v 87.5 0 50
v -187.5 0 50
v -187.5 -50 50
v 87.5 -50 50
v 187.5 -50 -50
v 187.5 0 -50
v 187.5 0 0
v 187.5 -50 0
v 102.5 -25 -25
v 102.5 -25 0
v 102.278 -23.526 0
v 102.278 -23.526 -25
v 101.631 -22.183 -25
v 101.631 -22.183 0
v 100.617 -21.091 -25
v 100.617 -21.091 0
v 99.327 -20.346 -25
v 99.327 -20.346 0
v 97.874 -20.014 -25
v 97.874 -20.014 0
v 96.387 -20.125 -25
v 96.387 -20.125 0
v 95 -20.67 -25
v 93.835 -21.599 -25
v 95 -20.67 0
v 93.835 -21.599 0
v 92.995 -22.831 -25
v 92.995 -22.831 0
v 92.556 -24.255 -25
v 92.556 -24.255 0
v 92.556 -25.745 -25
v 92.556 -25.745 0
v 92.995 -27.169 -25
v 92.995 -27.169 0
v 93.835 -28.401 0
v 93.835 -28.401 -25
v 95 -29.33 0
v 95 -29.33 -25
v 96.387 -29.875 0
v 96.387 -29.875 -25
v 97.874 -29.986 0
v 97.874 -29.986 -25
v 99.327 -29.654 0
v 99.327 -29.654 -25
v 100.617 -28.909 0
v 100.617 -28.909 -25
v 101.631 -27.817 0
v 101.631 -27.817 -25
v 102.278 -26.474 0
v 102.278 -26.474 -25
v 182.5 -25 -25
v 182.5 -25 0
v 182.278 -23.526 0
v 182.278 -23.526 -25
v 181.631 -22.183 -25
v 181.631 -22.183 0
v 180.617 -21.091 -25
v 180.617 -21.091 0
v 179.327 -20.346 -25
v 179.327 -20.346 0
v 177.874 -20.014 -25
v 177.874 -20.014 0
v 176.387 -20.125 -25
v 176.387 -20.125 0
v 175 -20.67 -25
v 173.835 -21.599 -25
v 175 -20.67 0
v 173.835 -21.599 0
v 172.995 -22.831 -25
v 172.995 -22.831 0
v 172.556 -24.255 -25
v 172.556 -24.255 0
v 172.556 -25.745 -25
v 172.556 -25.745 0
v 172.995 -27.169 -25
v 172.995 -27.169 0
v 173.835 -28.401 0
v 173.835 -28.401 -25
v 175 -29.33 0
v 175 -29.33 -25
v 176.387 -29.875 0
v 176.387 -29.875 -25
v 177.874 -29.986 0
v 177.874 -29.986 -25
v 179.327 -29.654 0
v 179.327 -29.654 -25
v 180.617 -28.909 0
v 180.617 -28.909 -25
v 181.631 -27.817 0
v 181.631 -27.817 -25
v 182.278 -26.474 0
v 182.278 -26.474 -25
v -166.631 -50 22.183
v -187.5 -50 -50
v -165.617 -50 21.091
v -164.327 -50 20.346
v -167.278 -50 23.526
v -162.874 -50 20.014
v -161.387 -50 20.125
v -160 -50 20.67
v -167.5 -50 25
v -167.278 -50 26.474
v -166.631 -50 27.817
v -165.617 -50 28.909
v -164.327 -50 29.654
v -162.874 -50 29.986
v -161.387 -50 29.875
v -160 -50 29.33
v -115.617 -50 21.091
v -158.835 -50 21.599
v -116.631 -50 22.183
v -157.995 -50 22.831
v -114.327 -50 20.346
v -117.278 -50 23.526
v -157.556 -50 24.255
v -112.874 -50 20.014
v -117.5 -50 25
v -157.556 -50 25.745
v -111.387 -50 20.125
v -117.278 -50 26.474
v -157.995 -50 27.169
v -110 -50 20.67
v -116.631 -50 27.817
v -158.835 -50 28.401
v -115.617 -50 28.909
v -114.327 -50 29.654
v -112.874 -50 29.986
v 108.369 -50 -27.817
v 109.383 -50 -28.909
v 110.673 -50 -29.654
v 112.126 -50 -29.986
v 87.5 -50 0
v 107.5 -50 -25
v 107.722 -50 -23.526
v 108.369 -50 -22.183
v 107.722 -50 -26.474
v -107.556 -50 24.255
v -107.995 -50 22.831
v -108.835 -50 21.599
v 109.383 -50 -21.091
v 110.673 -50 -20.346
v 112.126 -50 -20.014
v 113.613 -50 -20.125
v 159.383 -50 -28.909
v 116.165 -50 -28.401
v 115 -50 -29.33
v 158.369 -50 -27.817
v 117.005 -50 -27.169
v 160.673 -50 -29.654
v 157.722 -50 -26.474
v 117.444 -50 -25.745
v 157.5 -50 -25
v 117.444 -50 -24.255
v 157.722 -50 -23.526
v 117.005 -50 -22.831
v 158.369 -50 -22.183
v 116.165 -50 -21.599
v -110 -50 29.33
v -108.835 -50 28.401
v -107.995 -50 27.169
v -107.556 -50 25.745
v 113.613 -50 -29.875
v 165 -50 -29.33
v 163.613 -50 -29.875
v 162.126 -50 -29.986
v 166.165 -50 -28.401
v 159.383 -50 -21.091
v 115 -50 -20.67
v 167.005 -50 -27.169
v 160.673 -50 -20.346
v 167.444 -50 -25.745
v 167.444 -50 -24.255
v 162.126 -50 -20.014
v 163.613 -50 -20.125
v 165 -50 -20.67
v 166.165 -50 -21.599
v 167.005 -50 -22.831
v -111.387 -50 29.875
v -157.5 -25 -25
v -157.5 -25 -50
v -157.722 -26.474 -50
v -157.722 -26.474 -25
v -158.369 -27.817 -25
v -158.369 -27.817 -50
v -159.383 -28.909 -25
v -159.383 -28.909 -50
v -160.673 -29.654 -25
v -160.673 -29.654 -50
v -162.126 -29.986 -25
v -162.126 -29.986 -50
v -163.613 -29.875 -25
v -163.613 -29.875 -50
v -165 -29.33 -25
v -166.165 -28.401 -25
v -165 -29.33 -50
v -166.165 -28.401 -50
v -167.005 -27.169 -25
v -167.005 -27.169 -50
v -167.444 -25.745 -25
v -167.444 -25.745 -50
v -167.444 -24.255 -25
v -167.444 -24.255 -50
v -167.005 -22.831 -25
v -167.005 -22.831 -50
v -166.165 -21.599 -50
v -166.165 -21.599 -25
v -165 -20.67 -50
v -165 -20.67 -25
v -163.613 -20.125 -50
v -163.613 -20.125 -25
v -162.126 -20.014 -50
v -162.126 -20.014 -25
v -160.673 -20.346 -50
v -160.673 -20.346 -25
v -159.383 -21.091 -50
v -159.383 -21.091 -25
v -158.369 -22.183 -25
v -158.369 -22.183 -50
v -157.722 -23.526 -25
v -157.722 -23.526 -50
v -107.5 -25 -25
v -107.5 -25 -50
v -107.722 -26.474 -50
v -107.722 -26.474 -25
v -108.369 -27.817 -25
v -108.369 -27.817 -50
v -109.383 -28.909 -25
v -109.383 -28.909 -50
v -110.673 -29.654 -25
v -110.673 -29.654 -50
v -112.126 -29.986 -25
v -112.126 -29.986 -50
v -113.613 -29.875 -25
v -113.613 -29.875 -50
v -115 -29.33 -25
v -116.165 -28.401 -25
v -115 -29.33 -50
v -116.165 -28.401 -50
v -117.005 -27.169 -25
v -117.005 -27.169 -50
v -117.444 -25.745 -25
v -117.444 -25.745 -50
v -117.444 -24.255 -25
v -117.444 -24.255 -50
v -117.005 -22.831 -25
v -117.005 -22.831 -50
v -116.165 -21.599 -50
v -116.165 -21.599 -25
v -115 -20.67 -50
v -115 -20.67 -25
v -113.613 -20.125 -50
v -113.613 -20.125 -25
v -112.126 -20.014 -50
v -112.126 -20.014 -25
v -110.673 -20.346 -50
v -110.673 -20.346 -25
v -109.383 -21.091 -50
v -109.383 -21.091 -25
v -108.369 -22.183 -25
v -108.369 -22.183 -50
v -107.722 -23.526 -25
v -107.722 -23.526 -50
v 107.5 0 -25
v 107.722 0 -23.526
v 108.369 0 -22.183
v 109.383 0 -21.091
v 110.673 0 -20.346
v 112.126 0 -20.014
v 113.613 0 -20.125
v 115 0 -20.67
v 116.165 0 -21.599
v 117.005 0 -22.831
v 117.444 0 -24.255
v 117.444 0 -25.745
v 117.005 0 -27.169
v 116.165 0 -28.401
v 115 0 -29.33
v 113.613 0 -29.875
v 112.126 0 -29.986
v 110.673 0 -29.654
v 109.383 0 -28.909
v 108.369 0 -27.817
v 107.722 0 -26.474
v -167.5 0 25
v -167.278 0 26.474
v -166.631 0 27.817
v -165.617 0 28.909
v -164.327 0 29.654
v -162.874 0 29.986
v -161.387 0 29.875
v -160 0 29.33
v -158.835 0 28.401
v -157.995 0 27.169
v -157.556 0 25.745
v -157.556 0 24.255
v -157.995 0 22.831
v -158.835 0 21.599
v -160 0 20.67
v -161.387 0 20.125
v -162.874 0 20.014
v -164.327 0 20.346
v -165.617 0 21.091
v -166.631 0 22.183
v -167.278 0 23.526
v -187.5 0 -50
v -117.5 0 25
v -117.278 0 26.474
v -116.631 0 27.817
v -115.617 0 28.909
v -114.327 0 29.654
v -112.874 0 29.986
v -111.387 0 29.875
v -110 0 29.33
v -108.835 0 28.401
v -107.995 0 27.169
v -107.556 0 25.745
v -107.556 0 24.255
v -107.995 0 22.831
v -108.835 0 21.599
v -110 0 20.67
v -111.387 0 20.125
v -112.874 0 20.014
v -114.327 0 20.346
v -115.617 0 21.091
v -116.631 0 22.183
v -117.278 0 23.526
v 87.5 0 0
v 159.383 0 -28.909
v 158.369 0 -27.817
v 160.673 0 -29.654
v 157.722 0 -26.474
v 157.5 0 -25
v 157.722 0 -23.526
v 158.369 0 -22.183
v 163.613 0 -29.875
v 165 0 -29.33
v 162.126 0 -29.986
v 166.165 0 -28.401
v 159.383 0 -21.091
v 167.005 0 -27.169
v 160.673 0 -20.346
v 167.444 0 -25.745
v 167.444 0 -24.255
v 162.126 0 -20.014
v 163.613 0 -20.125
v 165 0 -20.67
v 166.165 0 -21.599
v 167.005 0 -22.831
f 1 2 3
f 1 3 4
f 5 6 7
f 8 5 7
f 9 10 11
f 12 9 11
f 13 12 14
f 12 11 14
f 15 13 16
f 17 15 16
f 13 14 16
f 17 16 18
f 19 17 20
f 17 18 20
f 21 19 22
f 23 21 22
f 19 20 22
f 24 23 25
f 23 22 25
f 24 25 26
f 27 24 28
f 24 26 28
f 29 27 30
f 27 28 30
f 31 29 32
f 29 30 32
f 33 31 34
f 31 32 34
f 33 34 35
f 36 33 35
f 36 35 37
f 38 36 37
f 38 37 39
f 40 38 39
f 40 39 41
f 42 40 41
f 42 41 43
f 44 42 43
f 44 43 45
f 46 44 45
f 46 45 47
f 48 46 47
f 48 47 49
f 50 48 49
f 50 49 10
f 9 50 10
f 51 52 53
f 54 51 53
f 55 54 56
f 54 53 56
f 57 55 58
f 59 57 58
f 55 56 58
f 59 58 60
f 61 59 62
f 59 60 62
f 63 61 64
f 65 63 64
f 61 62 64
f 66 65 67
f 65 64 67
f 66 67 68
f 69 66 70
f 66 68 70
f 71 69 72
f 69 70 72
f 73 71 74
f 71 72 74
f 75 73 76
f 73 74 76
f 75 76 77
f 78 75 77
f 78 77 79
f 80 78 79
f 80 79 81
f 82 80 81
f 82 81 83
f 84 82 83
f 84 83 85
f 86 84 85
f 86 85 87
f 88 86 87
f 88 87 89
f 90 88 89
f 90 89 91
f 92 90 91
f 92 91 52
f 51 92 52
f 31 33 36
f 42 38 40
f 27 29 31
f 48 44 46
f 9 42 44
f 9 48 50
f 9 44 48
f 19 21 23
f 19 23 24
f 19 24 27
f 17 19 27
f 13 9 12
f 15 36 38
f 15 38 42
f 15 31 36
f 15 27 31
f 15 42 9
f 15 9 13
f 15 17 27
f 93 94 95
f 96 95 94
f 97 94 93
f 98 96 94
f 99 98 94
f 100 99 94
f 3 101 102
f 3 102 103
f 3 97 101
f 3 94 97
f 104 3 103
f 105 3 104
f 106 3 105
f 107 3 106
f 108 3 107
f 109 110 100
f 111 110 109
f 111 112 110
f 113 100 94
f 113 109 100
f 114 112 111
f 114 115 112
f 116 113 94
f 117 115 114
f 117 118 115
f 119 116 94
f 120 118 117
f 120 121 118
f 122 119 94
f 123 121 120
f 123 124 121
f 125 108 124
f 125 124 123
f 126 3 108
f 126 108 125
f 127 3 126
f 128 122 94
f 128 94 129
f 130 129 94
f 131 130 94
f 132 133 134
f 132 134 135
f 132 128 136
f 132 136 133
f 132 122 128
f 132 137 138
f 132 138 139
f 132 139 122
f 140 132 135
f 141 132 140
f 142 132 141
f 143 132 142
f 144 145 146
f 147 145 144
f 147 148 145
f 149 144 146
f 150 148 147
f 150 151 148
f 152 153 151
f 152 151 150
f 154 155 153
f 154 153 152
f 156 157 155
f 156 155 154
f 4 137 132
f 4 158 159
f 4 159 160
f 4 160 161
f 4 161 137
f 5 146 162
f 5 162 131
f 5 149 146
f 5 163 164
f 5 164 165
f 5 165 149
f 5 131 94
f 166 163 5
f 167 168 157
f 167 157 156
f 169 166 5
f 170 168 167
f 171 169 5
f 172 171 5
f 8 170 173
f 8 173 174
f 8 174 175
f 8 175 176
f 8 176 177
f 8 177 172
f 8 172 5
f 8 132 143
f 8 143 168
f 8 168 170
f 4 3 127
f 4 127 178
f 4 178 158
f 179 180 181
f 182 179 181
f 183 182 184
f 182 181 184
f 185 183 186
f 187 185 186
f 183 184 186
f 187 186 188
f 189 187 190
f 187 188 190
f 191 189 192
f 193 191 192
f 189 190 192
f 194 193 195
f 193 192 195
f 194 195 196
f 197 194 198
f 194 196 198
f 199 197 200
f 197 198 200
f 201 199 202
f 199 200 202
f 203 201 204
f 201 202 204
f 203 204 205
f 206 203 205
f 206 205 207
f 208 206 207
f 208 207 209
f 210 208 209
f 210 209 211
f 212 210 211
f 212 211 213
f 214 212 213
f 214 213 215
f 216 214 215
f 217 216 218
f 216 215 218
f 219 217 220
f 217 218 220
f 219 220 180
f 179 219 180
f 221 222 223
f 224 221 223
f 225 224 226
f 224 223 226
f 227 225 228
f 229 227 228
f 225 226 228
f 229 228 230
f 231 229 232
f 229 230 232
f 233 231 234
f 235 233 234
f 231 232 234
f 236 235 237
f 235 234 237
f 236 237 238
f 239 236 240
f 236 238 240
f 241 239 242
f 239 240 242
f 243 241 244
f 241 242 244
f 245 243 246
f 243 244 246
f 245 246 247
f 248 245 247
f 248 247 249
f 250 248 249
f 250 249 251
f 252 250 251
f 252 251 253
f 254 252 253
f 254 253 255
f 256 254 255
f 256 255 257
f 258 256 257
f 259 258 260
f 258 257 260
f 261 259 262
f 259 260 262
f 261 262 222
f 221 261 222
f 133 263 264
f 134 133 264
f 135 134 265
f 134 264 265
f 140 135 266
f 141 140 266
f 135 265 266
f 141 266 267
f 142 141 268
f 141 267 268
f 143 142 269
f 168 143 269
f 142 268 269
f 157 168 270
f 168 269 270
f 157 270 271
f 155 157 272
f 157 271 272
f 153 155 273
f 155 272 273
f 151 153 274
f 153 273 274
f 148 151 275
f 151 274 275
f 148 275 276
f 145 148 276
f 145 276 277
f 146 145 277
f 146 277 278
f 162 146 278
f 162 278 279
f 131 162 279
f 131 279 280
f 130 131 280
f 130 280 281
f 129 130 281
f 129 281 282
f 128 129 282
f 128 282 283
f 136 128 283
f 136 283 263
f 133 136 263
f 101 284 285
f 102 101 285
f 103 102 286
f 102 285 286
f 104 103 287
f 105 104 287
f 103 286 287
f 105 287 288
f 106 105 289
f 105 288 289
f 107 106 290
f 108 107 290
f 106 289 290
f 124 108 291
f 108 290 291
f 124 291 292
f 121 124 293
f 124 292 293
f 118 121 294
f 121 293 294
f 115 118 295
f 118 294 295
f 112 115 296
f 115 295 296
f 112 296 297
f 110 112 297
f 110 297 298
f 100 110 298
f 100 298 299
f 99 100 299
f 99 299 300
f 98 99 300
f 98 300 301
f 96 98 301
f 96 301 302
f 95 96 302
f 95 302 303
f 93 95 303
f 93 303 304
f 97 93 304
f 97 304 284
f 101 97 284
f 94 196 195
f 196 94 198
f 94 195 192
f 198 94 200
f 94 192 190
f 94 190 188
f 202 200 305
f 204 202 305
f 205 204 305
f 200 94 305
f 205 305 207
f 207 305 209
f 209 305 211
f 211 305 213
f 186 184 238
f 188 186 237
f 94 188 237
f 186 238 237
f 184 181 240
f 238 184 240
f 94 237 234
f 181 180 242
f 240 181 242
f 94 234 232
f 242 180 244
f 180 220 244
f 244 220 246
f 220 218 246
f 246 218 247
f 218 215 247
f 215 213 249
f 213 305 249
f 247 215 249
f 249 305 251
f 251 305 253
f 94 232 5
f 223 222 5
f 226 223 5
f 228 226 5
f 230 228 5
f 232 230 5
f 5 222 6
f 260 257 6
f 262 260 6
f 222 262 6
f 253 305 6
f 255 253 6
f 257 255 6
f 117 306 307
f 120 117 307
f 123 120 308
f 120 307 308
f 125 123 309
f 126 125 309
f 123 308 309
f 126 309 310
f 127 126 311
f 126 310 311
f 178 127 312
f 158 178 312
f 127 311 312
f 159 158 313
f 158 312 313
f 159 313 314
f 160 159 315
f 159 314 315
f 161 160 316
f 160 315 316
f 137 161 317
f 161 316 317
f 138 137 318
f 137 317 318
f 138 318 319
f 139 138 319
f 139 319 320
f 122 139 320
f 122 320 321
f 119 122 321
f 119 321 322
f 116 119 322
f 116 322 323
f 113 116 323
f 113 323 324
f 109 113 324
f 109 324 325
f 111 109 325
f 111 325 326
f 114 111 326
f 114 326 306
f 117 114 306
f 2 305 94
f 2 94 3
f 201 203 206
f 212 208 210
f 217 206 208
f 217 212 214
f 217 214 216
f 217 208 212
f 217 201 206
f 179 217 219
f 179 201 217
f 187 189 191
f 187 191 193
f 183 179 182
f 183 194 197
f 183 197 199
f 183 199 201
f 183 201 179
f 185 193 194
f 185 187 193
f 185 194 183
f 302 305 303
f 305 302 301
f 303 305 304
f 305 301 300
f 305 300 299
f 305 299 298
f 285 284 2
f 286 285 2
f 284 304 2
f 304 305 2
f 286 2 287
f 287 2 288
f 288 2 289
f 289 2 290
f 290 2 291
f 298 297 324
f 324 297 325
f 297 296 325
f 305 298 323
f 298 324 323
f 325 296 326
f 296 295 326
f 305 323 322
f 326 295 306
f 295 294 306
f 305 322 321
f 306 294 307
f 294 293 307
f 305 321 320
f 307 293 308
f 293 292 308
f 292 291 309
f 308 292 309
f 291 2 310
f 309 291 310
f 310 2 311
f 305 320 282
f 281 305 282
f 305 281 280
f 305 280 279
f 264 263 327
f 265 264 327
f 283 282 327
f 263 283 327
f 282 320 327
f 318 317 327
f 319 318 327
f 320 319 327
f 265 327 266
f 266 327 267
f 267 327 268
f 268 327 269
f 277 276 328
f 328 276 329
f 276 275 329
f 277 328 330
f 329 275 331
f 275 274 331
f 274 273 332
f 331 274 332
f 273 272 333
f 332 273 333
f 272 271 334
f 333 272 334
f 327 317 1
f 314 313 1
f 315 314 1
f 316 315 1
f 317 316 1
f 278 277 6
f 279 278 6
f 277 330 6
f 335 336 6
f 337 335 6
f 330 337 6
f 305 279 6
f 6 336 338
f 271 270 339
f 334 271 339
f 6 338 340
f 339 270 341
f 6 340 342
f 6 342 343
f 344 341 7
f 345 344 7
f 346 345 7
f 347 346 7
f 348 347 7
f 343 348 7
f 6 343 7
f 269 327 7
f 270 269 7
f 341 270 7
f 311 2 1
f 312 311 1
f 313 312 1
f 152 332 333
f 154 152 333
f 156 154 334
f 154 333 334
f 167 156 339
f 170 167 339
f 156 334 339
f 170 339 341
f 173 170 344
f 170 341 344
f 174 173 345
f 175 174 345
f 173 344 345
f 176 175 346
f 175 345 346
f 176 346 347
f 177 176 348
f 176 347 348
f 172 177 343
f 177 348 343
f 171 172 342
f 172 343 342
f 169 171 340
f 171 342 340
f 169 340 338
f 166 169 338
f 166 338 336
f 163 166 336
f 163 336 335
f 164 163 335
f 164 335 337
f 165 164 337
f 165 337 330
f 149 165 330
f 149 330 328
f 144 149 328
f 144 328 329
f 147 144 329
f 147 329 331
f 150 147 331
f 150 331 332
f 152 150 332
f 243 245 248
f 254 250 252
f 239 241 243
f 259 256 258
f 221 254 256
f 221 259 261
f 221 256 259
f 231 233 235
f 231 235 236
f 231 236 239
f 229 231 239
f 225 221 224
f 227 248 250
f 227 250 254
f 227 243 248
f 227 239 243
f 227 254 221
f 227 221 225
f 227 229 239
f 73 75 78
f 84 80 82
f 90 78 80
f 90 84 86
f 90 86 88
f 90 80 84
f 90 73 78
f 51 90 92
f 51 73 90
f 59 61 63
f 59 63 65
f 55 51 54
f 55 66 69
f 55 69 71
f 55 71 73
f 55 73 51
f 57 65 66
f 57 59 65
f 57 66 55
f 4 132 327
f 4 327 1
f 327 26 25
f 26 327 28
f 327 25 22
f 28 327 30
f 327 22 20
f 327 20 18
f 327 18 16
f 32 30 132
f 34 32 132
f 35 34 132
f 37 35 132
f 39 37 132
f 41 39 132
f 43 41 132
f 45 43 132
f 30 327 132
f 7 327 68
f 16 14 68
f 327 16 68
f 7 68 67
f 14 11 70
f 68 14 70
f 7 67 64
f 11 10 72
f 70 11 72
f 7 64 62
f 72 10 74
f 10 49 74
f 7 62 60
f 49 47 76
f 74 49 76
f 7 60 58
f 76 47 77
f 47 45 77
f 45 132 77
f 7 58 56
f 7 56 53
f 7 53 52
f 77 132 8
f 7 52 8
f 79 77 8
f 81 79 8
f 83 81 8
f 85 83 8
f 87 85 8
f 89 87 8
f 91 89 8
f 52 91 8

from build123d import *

# Parameters (mm, degrees)
F0_W     = 375
F0_H     = 100
F1_DEPTH = 50
F2_R     = 5
F3_DEPTH = 75
F4_W     = 100
F4_H     = 50
F5_DEPTH = 50.001
F6_R     = 5
F7_DEPTH = 50.001
F8_R     = 5
F9_DEPTH = 25


with BuildPart() as f1:
    # F0 (on Front) → F1 (new body)
    with BuildSketch(Plane.XZ):
        Rectangle(F0_W, F0_H)
    extrude(amount=F1_DEPTH)

    # F2 (on face) → F3 (cut)
    with BuildSketch(Plane.XY.offset(50)):
        with Locations((97.5, -25)):
            Circle(F2_R)
        with Locations((177.5, -25)):
            Circle(F2_R)
    extrude(amount=-F3_DEPTH, mode=Mode.SUBTRACT)

    # F4 (on face) → F5 (cut, through all)
    with BuildSketch(Plane.XZ.offset(50)):
        with Locations((137.5, 25)):
            Rectangle(F4_W, F4_H)
    extrude(amount=-F5_DEPTH, mode=Mode.SUBTRACT)

    # F6 (on face) → F7 (cut, through all)
    with BuildSketch(Plane(origin=(0, 0, 0), x_dir=(-1, 0, 0), z_dir=(0, 1, 0))):
        with Locations((-112.5, -25)):
            Circle(F6_R)
        with Locations((-162.5, -25)):
            Circle(F6_R)
        with Locations((162.5, 25)):
            Circle(F6_R)
        with Locations((112.5, 25)):
            Circle(F6_R)
    extrude(amount=-F7_DEPTH, mode=Mode.SUBTRACT)

    # F8 (on face) → F9 (cut)
    with BuildSketch(Plane(origin=(0, 0, -50), x_dir=(1, 0, 0), z_dir=(0, 0, -1))):
        with Locations((-162.5, 25)):
            Circle(F8_R)
        with Locations((-112.5, 25)):
            Circle(F8_R)
    extrude(amount=-F9_DEPTH, mode=Mode.SUBTRACT)


solid = f1.part
